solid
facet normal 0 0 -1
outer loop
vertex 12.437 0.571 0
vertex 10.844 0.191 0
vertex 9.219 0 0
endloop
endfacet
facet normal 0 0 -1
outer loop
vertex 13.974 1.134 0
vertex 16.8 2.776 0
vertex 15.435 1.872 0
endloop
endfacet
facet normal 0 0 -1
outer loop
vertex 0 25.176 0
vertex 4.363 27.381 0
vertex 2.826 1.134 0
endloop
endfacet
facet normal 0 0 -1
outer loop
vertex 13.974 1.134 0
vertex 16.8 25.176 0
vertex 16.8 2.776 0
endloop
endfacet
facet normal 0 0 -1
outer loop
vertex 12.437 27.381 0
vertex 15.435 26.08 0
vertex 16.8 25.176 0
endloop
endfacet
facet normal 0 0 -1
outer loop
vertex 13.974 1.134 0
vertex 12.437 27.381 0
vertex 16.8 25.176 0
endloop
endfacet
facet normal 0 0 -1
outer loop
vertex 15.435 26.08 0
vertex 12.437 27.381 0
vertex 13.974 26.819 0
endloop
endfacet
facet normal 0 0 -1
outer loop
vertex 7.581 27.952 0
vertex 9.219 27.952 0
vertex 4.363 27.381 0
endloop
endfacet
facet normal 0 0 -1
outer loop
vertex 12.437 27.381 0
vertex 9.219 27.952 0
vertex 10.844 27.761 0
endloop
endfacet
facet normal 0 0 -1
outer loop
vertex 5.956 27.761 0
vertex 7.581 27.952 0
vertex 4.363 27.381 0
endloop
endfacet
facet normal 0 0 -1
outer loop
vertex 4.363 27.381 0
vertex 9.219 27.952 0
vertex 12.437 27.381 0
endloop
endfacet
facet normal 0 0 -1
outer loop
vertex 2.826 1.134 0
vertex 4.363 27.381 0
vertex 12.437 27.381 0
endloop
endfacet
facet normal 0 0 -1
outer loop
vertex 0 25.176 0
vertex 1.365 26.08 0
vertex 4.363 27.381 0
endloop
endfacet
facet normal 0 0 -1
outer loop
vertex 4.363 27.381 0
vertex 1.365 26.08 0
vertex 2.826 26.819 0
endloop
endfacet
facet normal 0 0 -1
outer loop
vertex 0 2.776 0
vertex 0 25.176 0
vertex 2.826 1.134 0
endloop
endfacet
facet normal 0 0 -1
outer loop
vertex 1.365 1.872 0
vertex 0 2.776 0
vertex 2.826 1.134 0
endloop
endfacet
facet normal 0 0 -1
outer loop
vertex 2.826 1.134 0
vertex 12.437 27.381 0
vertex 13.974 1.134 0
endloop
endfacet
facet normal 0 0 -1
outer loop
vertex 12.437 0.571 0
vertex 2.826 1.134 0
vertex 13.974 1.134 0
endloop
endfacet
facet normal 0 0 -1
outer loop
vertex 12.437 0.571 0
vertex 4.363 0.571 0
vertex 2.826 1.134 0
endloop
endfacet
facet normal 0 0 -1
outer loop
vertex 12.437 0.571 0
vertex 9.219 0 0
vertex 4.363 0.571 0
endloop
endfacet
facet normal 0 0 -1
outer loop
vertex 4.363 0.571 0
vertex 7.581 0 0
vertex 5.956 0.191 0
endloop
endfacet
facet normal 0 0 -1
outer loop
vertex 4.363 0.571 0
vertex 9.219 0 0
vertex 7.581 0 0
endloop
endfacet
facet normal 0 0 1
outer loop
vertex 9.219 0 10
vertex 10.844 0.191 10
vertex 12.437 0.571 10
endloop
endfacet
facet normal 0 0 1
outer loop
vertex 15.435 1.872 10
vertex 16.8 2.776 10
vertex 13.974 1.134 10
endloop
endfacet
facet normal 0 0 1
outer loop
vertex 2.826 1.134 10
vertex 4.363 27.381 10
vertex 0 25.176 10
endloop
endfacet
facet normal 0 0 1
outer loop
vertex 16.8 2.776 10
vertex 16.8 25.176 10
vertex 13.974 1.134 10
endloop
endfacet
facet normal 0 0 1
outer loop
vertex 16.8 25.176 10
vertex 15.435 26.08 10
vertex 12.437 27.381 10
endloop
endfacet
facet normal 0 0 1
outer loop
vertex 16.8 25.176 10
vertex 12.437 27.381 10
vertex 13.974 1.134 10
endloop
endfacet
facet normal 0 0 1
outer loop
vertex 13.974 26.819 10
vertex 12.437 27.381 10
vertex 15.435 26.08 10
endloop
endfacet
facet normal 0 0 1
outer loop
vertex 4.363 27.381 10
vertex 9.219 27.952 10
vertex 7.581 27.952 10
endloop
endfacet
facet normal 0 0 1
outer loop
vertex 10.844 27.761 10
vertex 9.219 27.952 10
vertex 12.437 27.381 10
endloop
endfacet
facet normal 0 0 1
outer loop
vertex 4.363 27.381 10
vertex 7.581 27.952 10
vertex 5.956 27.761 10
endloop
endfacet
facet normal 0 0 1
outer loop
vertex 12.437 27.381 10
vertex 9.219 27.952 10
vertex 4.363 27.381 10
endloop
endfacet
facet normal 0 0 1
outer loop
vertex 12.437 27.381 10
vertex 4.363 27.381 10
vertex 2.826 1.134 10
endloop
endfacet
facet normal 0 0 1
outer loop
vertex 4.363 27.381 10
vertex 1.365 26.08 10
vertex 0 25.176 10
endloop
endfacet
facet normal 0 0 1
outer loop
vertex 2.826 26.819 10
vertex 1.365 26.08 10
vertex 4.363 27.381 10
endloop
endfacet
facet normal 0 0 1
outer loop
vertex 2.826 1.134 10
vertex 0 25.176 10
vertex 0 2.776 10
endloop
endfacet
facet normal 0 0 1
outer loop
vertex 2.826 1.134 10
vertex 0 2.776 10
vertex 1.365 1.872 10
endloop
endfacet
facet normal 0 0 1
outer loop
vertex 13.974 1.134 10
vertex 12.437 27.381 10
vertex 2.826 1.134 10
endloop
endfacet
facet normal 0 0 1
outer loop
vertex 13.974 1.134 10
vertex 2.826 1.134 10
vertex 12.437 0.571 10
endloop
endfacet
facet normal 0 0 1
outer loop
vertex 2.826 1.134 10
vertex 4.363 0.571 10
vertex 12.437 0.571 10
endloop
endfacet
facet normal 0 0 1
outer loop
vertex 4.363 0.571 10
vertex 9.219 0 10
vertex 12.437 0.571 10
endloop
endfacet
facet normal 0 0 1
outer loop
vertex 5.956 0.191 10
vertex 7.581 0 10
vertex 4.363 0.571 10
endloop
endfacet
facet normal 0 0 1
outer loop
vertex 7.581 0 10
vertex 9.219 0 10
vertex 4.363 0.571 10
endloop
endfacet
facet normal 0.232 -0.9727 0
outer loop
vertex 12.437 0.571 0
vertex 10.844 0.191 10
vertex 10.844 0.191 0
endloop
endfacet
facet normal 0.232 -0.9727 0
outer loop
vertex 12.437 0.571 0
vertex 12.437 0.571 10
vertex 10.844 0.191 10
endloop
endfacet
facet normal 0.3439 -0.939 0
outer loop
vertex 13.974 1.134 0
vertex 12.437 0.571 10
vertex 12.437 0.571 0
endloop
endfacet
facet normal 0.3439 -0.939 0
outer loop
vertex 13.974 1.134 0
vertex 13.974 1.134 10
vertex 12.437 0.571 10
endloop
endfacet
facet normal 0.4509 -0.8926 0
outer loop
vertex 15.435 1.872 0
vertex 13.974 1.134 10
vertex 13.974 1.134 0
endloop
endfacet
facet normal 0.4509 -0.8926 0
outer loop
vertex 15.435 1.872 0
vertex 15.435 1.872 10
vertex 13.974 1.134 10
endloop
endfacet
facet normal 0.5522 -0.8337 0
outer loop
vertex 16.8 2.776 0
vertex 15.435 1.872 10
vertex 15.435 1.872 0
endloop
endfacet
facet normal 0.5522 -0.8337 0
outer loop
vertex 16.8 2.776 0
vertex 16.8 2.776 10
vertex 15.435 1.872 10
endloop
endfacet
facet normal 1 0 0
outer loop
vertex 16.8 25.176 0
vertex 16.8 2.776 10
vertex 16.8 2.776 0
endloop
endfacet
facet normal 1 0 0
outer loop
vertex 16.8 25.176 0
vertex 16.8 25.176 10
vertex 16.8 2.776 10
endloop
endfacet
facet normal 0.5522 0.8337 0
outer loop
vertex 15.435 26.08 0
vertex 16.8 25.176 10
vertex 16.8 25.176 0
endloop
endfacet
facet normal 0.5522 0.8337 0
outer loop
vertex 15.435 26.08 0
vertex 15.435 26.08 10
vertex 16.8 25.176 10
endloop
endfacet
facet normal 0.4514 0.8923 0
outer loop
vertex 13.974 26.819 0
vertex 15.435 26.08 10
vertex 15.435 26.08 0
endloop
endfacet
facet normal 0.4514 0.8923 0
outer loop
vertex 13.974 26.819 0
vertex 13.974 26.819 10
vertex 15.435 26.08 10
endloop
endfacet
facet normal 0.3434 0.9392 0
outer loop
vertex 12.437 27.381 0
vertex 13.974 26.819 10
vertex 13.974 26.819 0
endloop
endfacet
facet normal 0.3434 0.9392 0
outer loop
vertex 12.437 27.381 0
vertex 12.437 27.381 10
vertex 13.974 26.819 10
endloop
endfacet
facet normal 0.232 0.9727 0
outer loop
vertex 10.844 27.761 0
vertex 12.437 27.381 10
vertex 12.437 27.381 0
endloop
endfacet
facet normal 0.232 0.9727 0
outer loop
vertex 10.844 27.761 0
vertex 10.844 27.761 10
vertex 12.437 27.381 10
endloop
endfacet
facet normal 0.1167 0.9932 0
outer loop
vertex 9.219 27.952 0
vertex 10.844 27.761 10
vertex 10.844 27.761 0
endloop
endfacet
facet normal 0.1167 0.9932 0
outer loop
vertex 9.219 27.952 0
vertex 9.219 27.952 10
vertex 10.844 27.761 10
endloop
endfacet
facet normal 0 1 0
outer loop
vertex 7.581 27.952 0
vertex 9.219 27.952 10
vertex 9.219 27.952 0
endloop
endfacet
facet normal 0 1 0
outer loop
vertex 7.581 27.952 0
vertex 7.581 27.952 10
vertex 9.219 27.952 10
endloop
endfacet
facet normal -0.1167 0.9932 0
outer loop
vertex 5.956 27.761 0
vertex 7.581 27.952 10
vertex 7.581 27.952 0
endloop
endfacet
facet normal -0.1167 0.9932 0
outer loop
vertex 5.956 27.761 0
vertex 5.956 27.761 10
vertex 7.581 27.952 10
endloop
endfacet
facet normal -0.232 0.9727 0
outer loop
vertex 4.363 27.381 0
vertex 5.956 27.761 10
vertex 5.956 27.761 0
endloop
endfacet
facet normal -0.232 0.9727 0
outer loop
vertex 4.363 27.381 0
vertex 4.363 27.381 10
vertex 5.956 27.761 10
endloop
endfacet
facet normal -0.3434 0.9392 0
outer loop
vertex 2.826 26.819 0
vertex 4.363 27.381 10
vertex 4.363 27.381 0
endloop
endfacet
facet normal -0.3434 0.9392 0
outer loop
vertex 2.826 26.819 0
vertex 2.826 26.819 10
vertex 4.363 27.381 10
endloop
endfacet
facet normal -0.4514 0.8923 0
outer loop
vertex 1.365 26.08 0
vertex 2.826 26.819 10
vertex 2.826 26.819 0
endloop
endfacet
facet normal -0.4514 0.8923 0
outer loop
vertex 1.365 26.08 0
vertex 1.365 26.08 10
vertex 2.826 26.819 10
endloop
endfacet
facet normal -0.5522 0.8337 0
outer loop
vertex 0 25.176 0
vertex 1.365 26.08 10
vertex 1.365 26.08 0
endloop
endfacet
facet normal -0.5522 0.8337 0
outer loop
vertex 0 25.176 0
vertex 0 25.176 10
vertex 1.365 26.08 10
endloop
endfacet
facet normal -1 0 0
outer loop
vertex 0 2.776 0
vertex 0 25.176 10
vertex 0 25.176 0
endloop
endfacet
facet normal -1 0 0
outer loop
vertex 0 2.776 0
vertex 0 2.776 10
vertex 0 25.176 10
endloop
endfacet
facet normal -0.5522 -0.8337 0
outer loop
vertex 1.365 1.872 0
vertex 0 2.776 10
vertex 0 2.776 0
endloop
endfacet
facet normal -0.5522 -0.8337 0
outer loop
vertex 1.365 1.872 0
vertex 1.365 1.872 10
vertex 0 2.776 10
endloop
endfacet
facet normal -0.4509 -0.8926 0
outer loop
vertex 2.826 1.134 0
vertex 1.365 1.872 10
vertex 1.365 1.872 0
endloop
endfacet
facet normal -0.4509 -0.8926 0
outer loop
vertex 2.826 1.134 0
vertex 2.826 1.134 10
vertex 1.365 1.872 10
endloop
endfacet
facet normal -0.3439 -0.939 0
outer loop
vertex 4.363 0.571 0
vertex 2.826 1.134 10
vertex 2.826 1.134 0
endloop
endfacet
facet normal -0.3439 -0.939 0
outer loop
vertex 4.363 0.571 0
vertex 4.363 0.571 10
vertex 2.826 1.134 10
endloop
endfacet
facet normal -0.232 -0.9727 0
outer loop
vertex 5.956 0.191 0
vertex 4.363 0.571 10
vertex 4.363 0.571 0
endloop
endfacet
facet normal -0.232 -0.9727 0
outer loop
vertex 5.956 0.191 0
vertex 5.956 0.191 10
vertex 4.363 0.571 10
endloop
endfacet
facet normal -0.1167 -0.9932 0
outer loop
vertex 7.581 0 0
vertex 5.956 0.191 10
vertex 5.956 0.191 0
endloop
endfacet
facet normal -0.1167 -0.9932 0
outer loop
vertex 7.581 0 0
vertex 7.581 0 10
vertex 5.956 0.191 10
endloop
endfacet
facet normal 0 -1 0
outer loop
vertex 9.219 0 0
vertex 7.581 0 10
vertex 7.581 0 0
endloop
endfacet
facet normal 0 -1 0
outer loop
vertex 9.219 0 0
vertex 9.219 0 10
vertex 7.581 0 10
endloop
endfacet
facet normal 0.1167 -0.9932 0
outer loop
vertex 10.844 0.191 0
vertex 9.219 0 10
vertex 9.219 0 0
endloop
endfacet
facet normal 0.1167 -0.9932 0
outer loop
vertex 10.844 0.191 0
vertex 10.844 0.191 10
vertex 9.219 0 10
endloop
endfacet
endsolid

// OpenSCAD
$fn = 32;

// ----------------------------------------------------------------------
// Eccentric disc: double_d, 10 mm thick
// ----------------------------------------------------------------------

// --- parameters (mm) ---
profile_height = 10;      // extrusion height
profile_points = 24;      // points of the closed outline

profile = [[16.8, 25.176], [15.435, 26.08], [13.974, 26.819], [12.437, 27.381], [10.844, 27.761], [9.219, 27.952], [7.581, 27.952], [5.956, 27.761], [4.363, 27.381], [2.826, 26.819], [1.365, 26.08], [0, 25.176], [0, 2.776], [1.365, 1.872], [2.826, 1.134], [4.363, 0.571], [5.956, 0.191], [7.581, 0], [9.219, 0], [10.844, 0.191], [12.437, 0.571], [13.974, 1.134], [15.435, 1.872], [16.8, 2.776]];  // single closed polygon, 24 points, counter clockwise

// --- the one profile operation ---
linear_extrude(height = profile_height) polygon(points = profile);
